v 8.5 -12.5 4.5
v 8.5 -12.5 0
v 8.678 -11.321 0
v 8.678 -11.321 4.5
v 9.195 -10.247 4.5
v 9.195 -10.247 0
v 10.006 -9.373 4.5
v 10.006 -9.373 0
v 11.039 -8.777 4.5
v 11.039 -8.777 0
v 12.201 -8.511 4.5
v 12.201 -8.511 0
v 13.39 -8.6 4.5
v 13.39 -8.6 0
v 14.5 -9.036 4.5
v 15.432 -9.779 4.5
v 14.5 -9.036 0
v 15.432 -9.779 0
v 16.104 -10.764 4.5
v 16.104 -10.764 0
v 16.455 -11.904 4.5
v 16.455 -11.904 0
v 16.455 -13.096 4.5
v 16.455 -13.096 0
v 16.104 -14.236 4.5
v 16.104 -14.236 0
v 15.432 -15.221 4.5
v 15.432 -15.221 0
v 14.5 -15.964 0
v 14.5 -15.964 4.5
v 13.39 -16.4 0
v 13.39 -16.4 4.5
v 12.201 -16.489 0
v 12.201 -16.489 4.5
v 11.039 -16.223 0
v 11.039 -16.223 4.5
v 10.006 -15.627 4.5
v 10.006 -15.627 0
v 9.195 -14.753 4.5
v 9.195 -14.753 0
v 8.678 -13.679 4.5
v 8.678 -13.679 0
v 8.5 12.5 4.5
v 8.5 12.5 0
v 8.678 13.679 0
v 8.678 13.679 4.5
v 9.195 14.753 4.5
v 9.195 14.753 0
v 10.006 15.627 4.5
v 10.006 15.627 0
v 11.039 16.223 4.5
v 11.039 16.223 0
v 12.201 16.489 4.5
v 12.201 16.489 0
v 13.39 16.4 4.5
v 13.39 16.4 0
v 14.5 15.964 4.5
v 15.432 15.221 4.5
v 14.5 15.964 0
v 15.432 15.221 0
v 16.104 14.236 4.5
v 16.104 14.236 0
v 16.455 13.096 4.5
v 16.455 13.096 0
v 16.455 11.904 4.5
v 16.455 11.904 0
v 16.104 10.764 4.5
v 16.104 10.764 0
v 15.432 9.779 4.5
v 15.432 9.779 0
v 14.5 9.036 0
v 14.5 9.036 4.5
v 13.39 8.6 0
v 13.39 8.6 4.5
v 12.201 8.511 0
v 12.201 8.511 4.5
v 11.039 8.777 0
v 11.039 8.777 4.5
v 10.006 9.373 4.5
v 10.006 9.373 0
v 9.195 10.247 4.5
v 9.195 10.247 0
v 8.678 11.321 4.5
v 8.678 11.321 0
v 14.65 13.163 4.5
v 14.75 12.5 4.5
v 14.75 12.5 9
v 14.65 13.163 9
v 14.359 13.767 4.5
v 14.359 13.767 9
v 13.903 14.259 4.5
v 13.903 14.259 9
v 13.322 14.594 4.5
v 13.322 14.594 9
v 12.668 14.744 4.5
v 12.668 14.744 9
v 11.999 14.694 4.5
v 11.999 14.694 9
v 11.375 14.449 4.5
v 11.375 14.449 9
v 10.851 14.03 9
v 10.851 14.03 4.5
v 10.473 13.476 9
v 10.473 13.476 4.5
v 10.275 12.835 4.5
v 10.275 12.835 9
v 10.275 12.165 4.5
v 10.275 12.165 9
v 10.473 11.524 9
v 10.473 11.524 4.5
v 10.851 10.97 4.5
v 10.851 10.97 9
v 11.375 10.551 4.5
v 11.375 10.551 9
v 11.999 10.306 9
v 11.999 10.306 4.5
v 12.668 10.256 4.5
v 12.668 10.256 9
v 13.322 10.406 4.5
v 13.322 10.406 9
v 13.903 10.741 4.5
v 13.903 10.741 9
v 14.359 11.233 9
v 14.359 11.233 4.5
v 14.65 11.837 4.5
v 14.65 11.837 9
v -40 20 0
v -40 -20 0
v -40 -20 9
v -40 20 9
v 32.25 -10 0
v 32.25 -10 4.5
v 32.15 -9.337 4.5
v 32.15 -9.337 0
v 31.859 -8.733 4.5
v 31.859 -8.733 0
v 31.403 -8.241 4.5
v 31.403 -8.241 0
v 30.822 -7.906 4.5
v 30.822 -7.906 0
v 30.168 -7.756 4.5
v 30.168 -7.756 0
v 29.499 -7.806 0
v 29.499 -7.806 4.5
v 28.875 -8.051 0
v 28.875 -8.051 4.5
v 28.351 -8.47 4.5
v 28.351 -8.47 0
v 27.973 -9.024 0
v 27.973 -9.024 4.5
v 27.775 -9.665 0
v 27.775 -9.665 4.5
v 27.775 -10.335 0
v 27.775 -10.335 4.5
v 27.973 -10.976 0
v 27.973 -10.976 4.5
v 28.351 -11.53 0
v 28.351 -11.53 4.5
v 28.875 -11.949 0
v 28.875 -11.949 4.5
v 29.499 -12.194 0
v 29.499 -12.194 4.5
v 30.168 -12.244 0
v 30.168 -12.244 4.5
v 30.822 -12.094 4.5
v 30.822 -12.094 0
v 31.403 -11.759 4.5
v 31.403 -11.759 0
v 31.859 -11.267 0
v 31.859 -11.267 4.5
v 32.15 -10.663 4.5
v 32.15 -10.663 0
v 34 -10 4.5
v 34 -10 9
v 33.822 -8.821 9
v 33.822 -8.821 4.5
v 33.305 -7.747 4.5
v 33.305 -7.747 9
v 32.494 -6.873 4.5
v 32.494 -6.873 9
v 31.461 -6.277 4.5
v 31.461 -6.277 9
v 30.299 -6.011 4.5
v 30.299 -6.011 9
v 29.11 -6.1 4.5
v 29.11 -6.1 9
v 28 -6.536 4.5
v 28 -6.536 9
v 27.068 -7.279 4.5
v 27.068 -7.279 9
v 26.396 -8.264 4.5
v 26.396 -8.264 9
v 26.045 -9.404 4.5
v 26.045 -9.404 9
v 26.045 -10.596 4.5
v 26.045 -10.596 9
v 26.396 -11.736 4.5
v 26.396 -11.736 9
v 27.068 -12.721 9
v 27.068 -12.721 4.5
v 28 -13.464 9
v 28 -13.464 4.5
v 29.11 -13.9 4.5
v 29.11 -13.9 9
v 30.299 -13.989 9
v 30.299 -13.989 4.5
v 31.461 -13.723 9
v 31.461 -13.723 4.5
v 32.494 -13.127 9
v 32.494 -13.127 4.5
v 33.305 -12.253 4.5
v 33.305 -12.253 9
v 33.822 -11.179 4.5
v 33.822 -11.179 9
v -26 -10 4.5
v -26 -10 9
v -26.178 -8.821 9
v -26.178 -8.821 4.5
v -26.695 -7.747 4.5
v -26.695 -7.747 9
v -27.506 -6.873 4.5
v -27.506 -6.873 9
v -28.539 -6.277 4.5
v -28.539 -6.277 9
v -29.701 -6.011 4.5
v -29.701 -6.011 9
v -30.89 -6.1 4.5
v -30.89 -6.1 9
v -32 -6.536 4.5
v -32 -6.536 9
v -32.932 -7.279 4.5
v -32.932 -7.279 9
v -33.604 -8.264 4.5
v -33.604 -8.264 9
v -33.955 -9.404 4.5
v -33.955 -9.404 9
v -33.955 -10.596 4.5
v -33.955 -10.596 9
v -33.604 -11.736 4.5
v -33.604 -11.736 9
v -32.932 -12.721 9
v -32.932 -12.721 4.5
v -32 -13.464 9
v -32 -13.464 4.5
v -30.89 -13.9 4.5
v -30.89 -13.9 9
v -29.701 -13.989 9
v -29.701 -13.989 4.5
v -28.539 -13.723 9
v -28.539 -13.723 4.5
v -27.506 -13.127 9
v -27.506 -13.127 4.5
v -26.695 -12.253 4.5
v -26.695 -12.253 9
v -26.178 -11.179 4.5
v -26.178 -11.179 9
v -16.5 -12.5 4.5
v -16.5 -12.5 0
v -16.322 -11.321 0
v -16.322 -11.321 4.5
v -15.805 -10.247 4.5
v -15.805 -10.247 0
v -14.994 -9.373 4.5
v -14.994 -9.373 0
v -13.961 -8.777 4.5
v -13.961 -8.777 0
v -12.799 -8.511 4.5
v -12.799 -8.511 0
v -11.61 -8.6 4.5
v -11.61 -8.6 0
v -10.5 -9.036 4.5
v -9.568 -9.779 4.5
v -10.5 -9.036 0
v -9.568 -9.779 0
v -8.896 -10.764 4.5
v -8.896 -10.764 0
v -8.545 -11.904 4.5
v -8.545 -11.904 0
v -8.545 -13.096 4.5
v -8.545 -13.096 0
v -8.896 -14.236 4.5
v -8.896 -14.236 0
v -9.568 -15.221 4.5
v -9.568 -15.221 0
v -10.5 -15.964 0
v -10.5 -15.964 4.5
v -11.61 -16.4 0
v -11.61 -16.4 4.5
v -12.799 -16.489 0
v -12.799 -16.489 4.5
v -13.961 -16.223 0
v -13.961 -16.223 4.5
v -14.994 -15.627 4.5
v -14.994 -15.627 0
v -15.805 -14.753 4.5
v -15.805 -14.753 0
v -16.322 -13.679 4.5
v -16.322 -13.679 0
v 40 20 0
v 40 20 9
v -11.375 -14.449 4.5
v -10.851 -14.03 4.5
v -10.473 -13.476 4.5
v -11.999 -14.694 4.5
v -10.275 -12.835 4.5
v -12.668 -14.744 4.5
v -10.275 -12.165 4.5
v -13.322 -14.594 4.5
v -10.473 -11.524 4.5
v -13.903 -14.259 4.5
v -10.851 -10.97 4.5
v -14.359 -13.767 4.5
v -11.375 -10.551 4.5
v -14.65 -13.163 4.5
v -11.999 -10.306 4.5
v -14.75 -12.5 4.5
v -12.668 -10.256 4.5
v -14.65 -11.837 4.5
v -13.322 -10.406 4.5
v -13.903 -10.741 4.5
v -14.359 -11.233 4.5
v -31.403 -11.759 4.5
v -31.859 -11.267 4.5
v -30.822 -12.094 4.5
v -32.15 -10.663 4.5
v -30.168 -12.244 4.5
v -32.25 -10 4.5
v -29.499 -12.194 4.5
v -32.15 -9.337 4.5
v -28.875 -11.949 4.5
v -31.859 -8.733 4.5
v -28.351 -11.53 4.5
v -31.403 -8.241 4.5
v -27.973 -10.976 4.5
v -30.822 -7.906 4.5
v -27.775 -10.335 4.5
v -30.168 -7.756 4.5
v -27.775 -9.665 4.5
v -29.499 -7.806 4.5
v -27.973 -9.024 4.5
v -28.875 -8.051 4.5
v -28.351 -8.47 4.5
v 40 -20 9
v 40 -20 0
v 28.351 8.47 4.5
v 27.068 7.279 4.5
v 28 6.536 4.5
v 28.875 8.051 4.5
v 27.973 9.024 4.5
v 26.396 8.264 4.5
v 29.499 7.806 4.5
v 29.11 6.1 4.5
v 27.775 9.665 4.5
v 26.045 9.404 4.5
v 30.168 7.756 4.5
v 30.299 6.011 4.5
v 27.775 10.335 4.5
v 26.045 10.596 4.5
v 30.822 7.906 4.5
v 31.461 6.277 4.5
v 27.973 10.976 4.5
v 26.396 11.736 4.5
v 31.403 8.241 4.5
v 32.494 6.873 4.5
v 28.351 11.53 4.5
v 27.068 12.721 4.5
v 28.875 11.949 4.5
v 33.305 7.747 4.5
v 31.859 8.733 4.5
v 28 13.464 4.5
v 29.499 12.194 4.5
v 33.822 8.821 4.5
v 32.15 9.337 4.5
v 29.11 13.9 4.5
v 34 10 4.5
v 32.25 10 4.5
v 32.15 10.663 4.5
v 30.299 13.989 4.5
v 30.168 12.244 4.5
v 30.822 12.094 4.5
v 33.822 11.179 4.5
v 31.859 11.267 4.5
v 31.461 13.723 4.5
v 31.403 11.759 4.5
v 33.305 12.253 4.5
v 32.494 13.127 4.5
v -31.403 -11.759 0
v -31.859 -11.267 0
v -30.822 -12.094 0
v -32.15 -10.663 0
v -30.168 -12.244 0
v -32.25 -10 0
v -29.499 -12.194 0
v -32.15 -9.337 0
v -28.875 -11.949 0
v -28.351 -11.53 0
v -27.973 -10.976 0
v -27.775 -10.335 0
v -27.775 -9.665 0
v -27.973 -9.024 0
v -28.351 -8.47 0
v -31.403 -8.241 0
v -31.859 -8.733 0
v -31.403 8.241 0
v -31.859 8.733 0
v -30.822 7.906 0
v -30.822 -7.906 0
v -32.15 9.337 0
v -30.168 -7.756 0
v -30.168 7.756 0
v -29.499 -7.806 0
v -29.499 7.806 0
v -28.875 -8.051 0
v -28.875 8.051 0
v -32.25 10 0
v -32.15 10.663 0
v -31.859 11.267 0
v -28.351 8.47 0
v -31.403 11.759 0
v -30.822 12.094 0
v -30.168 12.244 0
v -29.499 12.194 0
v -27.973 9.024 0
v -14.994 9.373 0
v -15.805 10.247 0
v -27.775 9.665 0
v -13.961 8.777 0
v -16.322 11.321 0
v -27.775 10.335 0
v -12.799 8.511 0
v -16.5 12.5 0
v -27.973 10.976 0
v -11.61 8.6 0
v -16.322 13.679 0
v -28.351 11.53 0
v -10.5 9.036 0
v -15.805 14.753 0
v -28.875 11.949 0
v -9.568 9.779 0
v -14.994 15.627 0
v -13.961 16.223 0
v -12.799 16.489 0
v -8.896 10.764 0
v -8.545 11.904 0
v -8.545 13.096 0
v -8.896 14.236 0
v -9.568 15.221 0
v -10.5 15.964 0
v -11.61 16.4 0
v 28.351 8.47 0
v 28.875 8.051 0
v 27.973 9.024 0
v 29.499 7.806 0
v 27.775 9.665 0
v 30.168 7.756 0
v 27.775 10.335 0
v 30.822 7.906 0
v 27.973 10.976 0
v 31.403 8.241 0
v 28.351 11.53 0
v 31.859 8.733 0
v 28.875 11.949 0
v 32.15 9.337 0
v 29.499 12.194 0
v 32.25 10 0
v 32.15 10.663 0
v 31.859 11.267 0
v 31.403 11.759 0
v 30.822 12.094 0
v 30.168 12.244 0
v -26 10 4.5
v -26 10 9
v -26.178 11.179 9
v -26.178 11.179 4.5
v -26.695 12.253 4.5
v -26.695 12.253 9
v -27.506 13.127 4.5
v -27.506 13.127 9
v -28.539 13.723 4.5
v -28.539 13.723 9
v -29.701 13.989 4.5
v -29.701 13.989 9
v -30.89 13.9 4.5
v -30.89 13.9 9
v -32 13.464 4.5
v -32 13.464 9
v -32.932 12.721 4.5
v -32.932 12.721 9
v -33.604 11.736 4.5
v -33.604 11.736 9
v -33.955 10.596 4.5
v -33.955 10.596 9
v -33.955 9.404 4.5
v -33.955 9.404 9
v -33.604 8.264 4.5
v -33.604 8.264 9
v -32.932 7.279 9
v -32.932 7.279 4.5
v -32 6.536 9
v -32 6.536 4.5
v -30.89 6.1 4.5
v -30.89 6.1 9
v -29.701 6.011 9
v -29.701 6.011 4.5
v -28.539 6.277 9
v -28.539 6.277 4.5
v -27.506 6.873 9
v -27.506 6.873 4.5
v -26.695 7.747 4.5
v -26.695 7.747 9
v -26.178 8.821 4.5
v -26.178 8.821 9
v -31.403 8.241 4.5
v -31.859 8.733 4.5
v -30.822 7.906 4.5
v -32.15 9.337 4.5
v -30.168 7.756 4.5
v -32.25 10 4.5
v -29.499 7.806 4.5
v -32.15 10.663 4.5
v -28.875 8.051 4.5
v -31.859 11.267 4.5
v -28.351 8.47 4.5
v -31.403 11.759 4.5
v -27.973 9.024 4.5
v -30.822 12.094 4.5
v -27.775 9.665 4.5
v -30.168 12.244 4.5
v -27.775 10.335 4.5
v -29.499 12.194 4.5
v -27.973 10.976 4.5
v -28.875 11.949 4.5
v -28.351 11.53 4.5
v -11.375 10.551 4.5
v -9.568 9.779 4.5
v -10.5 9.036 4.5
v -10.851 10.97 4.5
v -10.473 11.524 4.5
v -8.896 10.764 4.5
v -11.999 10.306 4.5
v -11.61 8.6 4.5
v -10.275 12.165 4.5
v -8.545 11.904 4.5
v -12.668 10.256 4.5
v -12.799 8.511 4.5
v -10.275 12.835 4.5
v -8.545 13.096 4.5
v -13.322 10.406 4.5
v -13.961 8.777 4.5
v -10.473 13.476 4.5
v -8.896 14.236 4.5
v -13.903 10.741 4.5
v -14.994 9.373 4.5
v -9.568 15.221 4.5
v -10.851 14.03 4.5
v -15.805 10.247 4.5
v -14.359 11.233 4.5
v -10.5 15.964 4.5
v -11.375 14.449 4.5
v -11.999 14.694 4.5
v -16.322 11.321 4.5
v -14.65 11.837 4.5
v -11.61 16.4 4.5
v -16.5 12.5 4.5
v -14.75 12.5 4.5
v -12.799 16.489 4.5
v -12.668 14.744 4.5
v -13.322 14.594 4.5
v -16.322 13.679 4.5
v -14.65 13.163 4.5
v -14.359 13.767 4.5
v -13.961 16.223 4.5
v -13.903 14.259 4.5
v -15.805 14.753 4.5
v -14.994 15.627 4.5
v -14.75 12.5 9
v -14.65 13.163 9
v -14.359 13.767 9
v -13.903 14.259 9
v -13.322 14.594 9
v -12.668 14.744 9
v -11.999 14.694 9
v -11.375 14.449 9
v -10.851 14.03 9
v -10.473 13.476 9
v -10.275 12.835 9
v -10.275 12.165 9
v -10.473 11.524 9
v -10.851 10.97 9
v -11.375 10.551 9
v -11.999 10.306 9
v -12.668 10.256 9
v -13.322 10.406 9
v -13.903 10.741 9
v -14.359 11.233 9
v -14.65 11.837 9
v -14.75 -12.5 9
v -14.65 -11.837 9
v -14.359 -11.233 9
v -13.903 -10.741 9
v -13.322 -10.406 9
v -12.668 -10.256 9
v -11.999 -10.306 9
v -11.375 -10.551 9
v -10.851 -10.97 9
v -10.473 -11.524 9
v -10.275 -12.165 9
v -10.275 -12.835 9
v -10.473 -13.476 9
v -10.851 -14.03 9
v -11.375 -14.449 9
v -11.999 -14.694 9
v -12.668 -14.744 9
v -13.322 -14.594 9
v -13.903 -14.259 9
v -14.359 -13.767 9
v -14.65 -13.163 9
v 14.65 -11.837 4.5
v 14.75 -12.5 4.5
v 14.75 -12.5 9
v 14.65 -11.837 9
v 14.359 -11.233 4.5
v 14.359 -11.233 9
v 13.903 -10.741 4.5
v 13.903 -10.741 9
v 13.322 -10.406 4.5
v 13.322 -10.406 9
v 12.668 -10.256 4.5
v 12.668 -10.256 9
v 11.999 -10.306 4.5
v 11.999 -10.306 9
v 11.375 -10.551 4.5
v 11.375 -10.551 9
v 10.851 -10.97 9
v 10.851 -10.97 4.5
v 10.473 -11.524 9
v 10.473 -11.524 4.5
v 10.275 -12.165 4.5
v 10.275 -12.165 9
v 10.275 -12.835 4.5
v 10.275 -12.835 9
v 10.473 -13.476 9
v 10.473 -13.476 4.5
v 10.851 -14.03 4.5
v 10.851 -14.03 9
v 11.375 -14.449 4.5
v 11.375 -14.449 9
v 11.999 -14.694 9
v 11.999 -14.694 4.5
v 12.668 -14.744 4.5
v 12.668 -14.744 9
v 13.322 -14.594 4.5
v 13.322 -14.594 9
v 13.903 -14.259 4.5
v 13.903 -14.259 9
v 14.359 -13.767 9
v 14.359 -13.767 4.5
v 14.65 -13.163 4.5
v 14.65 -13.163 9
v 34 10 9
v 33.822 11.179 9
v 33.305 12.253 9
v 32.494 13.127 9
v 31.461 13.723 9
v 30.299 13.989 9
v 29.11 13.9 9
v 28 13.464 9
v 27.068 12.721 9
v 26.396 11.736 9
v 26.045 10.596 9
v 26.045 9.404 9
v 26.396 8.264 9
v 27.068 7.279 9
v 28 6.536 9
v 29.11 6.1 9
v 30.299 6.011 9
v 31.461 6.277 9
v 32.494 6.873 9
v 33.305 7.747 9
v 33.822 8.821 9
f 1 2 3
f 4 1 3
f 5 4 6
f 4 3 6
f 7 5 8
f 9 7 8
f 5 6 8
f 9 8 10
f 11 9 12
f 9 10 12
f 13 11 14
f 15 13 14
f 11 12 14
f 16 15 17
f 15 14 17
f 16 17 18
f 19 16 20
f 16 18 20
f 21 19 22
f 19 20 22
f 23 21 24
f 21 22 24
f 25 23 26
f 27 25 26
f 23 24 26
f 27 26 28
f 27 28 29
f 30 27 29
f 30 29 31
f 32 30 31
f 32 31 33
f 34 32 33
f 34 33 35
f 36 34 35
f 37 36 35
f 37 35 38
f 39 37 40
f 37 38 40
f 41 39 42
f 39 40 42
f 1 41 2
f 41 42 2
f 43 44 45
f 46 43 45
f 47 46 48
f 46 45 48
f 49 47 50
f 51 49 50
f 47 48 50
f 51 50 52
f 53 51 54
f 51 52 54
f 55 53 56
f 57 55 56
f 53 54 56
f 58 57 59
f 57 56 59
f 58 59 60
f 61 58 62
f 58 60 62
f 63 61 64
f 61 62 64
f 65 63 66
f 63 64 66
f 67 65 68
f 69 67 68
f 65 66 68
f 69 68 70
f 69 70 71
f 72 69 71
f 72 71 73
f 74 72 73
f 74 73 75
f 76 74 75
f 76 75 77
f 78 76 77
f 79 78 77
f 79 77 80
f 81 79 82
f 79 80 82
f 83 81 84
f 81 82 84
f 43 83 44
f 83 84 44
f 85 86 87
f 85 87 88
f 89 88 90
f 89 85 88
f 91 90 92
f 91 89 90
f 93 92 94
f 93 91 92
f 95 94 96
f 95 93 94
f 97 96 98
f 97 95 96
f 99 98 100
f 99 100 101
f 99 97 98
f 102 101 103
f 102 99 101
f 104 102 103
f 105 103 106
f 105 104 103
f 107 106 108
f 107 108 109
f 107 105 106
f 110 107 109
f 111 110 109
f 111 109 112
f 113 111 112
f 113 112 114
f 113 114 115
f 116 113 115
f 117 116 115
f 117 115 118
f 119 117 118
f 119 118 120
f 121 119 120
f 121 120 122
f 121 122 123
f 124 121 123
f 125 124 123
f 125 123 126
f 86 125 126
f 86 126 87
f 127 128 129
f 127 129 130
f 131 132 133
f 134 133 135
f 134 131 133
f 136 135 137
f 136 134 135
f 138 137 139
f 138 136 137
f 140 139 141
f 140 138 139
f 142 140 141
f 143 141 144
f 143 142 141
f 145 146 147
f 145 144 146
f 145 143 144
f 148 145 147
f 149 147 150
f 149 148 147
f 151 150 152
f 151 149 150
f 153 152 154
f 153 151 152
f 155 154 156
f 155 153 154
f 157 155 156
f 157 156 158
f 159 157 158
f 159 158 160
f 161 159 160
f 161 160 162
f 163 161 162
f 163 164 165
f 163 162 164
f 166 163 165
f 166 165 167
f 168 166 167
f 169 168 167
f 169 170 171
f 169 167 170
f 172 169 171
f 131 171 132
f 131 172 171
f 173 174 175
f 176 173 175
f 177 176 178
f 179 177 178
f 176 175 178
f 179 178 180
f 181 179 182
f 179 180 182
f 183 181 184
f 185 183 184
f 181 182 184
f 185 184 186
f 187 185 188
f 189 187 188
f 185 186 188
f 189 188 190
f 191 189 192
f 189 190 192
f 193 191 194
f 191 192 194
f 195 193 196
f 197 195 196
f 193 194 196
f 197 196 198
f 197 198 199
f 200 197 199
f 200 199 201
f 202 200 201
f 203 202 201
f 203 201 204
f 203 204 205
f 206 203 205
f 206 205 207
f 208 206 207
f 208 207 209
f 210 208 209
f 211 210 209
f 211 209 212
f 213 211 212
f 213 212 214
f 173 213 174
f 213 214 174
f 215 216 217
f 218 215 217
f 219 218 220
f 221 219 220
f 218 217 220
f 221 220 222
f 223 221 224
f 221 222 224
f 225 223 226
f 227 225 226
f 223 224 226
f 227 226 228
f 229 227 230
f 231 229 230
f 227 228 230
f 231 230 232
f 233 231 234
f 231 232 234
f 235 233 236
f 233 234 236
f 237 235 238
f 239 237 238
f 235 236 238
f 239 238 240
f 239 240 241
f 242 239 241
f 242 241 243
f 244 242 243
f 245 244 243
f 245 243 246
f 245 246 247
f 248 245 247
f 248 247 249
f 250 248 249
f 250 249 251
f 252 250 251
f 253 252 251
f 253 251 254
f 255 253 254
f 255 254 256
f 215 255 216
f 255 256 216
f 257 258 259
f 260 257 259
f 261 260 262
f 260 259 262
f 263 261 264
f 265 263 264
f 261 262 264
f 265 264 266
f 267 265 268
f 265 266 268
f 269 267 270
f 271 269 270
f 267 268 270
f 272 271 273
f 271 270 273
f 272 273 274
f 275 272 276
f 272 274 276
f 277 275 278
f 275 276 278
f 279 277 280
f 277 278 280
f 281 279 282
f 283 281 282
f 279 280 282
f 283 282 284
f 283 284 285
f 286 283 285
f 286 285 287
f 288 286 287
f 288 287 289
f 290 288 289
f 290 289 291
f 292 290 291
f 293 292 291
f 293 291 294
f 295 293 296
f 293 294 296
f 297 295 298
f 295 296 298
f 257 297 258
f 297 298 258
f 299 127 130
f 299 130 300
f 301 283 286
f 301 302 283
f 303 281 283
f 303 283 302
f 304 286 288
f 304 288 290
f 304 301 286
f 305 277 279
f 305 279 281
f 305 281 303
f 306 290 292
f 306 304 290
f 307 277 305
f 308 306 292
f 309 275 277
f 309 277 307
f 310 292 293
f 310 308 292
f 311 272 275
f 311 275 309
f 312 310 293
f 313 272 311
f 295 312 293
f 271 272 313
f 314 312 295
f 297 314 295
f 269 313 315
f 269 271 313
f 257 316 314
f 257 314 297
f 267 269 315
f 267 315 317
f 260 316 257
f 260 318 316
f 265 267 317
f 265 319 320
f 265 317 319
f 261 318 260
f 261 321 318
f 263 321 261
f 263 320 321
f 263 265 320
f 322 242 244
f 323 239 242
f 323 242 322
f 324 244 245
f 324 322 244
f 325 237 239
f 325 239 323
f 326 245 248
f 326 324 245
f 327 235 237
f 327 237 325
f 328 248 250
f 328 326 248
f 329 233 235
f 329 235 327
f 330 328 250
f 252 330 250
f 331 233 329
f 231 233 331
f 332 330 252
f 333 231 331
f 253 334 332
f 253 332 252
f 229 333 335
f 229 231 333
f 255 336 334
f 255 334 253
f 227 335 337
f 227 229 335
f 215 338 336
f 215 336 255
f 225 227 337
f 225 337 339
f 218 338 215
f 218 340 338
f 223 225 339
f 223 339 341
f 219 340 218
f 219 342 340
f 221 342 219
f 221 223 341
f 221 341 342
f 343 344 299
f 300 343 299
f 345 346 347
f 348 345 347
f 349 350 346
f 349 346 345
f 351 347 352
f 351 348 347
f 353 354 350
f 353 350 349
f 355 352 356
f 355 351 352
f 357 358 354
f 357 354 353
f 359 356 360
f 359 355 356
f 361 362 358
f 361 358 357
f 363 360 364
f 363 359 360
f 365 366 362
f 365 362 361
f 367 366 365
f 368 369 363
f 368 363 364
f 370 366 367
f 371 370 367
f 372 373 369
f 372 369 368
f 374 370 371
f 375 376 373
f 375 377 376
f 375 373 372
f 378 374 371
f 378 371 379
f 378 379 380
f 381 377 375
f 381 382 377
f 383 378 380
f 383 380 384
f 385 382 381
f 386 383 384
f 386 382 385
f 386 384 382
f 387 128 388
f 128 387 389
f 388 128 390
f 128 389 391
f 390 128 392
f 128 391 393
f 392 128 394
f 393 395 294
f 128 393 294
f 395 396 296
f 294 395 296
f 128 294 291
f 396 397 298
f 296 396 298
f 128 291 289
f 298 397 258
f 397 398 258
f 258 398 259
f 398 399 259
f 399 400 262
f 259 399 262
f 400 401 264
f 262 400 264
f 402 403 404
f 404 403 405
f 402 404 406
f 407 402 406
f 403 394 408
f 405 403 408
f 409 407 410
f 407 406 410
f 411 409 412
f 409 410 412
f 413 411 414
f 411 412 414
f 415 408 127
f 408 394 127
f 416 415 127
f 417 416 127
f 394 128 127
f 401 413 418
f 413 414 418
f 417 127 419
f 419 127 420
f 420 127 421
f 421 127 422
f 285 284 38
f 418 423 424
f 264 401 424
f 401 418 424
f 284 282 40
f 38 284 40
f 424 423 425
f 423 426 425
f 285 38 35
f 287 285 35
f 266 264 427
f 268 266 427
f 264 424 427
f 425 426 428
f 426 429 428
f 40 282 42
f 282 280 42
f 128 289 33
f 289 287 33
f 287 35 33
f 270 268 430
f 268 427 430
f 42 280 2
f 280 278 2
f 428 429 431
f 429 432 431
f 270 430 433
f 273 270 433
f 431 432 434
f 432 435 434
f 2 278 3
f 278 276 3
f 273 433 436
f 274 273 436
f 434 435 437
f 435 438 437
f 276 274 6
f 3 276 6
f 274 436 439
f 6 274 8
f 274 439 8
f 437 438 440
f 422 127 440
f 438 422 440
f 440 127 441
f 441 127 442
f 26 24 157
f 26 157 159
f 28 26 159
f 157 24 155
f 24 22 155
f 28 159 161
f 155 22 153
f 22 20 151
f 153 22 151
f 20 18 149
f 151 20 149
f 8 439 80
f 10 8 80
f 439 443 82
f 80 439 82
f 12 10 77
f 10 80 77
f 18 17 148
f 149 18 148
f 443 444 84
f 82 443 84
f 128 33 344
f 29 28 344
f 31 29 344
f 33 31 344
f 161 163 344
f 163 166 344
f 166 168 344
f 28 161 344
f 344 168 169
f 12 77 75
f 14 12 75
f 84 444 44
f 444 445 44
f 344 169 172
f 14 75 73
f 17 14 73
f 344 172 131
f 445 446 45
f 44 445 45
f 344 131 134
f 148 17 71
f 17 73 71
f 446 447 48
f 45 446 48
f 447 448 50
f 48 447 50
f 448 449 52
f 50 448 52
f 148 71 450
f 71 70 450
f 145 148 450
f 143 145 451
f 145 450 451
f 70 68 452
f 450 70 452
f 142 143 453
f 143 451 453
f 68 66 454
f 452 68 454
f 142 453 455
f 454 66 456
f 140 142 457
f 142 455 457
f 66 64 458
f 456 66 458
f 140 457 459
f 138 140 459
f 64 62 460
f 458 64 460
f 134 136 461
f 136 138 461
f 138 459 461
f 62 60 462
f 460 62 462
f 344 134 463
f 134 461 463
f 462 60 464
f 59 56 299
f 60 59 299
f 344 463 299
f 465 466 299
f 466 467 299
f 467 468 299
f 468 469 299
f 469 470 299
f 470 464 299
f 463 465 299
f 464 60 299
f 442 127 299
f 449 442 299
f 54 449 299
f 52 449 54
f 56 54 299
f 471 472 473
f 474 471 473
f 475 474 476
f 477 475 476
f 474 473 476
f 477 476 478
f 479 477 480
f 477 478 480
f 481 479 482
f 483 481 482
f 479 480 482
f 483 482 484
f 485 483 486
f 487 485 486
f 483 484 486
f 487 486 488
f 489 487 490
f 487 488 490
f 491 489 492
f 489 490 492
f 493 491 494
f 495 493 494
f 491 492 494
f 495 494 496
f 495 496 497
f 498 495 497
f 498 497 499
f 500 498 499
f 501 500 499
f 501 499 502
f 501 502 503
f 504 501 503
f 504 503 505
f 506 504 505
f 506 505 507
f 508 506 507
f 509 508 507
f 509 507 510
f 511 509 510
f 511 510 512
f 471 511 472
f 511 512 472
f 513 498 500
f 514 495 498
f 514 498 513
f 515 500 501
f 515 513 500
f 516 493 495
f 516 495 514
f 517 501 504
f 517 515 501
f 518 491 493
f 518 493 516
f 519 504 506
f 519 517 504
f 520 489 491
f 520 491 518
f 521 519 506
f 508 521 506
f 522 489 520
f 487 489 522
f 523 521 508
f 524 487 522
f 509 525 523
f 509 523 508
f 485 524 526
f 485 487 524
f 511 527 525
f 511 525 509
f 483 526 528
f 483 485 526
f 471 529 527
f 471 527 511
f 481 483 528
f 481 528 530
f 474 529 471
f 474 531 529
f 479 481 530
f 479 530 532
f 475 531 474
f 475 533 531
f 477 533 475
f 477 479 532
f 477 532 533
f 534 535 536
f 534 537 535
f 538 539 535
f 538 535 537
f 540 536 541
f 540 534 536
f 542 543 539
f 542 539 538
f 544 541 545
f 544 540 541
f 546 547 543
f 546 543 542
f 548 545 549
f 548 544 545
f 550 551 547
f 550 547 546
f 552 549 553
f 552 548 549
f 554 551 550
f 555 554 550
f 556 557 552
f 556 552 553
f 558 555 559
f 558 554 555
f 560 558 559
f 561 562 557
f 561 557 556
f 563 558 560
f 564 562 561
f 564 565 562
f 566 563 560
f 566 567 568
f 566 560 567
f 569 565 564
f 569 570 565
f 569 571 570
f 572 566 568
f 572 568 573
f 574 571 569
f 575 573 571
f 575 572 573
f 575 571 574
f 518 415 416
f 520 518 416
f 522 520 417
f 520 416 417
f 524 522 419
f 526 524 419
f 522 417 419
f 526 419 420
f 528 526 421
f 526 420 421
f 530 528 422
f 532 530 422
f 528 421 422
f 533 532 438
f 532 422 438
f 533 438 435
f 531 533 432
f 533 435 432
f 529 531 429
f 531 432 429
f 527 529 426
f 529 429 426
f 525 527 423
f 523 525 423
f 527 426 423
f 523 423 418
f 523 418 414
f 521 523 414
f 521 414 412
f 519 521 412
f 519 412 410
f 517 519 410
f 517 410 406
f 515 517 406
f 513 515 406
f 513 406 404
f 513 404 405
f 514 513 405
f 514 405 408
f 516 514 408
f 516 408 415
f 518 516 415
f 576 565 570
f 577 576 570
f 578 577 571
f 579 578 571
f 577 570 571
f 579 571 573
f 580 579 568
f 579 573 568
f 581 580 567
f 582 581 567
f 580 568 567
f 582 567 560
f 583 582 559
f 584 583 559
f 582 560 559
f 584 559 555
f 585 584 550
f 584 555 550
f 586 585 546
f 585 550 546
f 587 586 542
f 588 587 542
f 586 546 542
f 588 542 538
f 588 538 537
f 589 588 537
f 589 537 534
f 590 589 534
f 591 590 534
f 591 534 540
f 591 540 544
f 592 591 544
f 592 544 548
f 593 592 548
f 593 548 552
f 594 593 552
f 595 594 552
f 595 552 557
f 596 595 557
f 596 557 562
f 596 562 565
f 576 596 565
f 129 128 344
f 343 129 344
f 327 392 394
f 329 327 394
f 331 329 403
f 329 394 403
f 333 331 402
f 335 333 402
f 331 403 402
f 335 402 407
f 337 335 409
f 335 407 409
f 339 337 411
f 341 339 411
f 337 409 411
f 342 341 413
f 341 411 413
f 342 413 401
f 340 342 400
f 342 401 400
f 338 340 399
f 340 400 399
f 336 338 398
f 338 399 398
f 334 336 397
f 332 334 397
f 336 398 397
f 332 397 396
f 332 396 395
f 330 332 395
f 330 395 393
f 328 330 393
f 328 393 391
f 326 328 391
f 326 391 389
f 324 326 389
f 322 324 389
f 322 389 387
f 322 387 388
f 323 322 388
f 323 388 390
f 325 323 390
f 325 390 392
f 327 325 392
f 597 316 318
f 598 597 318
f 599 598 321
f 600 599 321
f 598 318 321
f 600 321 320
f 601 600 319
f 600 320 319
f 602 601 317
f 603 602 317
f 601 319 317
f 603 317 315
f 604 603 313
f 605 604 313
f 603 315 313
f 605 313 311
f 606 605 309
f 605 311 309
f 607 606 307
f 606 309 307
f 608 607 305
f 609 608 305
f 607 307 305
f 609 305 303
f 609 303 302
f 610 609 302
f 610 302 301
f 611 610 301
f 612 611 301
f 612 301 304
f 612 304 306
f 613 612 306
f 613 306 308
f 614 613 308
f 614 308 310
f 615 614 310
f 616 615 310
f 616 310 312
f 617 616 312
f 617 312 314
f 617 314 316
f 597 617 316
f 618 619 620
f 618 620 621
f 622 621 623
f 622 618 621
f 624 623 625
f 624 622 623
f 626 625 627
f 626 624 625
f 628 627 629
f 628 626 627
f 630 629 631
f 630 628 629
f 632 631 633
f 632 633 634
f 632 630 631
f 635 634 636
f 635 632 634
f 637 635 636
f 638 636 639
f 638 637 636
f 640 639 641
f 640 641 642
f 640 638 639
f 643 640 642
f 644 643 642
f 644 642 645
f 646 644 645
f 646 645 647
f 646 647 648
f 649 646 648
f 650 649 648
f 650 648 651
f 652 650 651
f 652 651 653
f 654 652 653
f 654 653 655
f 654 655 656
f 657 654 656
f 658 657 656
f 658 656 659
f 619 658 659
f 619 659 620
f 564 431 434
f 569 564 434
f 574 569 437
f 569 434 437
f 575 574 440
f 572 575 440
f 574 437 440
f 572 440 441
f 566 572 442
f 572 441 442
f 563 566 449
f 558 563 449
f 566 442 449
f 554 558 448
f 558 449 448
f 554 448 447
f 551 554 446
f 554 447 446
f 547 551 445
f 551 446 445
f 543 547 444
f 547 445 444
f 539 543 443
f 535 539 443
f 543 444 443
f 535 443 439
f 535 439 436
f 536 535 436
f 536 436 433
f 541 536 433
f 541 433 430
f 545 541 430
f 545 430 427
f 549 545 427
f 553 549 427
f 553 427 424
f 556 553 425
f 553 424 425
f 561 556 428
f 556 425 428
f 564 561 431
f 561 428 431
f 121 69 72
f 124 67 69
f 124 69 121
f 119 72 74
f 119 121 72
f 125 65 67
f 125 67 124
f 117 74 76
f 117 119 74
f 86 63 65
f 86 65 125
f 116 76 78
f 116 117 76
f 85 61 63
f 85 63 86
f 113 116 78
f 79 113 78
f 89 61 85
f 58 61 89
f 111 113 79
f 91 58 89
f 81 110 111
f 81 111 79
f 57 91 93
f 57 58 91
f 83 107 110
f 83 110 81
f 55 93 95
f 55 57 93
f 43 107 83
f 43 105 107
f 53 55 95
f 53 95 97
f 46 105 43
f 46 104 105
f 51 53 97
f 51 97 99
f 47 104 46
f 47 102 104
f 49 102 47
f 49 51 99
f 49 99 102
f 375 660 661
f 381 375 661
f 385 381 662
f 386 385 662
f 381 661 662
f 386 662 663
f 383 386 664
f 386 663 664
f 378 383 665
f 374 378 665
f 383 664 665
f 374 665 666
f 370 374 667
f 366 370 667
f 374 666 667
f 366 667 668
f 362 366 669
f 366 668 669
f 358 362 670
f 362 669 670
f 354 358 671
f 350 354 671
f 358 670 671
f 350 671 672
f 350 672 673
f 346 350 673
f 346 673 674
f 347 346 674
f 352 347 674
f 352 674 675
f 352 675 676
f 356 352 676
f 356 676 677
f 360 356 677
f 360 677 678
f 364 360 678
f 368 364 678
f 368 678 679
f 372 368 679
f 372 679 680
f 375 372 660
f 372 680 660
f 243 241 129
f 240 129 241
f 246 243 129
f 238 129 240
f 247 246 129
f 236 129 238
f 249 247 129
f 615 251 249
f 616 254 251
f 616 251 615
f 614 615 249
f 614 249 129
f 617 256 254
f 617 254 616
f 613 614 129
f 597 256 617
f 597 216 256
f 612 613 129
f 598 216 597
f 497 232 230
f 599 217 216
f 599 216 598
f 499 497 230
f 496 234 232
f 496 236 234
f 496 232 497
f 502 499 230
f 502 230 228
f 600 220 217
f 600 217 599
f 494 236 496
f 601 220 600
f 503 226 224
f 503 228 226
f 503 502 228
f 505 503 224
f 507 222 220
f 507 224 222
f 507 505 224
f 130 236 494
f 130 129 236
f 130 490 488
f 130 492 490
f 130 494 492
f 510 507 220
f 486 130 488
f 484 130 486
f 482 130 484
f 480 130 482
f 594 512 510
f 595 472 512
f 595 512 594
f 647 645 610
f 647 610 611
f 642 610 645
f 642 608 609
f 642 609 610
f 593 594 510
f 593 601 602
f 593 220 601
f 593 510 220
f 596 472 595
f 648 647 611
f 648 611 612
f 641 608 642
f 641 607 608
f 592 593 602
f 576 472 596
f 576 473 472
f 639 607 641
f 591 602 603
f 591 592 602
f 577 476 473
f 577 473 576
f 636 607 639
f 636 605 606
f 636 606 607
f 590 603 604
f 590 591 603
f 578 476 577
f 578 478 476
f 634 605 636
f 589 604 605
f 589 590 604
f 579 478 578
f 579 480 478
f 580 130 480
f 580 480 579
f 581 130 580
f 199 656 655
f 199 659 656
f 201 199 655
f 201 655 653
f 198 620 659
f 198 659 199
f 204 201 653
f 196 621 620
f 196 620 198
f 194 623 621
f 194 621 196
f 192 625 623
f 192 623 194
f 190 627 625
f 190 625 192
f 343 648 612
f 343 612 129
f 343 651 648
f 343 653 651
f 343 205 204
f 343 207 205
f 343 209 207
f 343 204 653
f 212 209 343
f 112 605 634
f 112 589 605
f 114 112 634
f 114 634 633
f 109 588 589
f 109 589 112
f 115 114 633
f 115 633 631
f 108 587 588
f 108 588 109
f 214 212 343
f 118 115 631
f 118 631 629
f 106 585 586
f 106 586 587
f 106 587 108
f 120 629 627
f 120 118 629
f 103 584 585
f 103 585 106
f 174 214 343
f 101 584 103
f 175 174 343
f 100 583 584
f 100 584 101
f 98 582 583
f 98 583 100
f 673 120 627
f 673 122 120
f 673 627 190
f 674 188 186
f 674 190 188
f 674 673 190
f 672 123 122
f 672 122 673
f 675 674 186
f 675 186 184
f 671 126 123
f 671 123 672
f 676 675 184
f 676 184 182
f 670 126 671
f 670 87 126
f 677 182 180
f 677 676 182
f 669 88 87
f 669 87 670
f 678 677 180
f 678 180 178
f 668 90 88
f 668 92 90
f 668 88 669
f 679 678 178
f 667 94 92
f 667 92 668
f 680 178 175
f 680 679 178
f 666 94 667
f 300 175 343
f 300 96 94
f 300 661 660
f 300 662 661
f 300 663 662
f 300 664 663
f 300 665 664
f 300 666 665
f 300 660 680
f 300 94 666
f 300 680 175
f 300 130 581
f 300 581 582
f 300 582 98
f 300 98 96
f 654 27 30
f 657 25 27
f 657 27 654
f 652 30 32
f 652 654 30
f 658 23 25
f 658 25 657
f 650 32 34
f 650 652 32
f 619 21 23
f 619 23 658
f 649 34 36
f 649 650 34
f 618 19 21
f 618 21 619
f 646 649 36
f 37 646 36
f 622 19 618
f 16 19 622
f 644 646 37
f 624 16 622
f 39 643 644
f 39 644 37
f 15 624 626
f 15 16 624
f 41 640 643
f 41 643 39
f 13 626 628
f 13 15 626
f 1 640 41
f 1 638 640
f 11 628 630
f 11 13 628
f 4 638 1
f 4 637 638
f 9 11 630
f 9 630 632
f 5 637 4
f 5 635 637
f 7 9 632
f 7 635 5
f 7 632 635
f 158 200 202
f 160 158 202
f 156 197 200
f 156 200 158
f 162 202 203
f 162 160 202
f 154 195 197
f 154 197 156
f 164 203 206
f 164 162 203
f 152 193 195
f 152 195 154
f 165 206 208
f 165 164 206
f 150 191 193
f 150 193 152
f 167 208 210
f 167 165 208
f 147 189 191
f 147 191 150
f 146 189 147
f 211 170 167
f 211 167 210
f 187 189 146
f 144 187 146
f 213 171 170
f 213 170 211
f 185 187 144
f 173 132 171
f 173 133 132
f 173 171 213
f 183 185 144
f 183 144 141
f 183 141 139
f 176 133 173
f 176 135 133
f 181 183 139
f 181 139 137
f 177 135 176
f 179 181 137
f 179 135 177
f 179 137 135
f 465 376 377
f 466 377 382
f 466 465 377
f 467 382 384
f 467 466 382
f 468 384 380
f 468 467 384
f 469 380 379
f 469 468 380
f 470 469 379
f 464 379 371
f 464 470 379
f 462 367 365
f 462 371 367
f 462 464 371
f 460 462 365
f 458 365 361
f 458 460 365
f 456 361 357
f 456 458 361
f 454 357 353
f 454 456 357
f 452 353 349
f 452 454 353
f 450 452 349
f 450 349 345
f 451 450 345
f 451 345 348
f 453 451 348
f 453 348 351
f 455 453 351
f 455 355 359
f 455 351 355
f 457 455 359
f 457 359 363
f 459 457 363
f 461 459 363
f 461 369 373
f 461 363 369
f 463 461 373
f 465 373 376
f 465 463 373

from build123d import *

# Parameters (mm, degrees)
SKETCH_1_W          = 80
SKETCH_1_H          = 40
EXTRUDE_1_DEPTH     = 9
SKETCH_2_R          = 2.25
CUT_EXTRUDE_1_DEPTH = 46.617978912
SKETCH_3_R          = 2.25
CUT_EXTRUDE_2_DEPTH = 9
SKETCH_4_R          = 4
CUT_EXTRUDE_3_DEPTH = 4.5
SKETCH_6_R          = 4
CUT_EXTRUDE_5_DEPTH = 4.5


with BuildPart() as part:
    # 草图1 → 凸台-拉伸1 (new body)
    with BuildSketch(Plane.XY):
        Rectangle(SKETCH_1_W, SKETCH_1_H)
    extrude(amount=EXTRUDE_1_DEPTH)

    # 草图2 → 切除-拉伸1 (cut, through all)
    with BuildSketch(Plane(origin=(0, 0, 0), x_dir=(-1, 0, 0), z_dir=(0, 0, -1))):
        with Locations((30, 10)):
            Circle(SKETCH_2_R)
        with Locations((30, -10)):
            Circle(SKETCH_2_R)
    cut_extrude_1 = extrude(amount=-CUT_EXTRUDE_1_DEPTH, mode=Mode.SUBTRACT)

    # 镜向1: 切除-拉伸1 across plane
    add(cut_extrude_1.mirror(Plane(origin=(0, 0, 0), x_dir=(0, 0, 1), z_dir=(1, 0, 0))), mode=Mode.SUBTRACT)

    # 草图3 → 切除-拉伸2 (cut)
    with BuildSketch(Plane(origin=(0, 0, 0), x_dir=(-1, 0, 0), z_dir=(0, 0, -1))):
        with Locations((12.5, -12.5)):
            Circle(SKETCH_3_R)
        with Locations((12.5, 12.5)):
            Circle(SKETCH_3_R)
    cut_extrude_2 = extrude(amount=-CUT_EXTRUDE_2_DEPTH, mode=Mode.SUBTRACT)

    # 镜向2: 切除-拉伸2 across plane
    add(cut_extrude_2.mirror(Plane(origin=(0, 0, 0), x_dir=(0, 0, 1), z_dir=(1, 0, 0))), mode=Mode.SUBTRACT)

    # 草图4 → 切除-拉伸3 (cut)
    with BuildSketch(Plane(origin=(0, 0, 0), x_dir=(-1, 0, 0), z_dir=(0, 0, -1))):
        with Locations((12.5, 12.5)):
            Circle(SKETCH_4_R)
        with Locations((12.5, -12.5)):
            Circle(SKETCH_4_R)
        with Locations((-12.5, 12.5)):
            Circle(SKETCH_4_R)
        with Locations((-12.5, -12.5)):
            Circle(SKETCH_4_R)
    extrude(amount=-CUT_EXTRUDE_3_DEPTH, mode=Mode.SUBTRACT)

    # 草图6 → 切除-拉伸5 (cut)
    with BuildSketch(Plane.XY.offset(9)):
        with Locations((-30, -10)):
            Circle(SKETCH_6_R)
        with Locations((-30, 10)):
            Circle(SKETCH_6_R)
        with Locations((30, -10)):
            Circle(SKETCH_6_R)
        with Locations((30, 10)):
            Circle(SKETCH_6_R)
    extrude(amount=-CUT_EXTRUDE_5_DEPTH, mode=Mode.SUBTRACT)


solid = part.part
